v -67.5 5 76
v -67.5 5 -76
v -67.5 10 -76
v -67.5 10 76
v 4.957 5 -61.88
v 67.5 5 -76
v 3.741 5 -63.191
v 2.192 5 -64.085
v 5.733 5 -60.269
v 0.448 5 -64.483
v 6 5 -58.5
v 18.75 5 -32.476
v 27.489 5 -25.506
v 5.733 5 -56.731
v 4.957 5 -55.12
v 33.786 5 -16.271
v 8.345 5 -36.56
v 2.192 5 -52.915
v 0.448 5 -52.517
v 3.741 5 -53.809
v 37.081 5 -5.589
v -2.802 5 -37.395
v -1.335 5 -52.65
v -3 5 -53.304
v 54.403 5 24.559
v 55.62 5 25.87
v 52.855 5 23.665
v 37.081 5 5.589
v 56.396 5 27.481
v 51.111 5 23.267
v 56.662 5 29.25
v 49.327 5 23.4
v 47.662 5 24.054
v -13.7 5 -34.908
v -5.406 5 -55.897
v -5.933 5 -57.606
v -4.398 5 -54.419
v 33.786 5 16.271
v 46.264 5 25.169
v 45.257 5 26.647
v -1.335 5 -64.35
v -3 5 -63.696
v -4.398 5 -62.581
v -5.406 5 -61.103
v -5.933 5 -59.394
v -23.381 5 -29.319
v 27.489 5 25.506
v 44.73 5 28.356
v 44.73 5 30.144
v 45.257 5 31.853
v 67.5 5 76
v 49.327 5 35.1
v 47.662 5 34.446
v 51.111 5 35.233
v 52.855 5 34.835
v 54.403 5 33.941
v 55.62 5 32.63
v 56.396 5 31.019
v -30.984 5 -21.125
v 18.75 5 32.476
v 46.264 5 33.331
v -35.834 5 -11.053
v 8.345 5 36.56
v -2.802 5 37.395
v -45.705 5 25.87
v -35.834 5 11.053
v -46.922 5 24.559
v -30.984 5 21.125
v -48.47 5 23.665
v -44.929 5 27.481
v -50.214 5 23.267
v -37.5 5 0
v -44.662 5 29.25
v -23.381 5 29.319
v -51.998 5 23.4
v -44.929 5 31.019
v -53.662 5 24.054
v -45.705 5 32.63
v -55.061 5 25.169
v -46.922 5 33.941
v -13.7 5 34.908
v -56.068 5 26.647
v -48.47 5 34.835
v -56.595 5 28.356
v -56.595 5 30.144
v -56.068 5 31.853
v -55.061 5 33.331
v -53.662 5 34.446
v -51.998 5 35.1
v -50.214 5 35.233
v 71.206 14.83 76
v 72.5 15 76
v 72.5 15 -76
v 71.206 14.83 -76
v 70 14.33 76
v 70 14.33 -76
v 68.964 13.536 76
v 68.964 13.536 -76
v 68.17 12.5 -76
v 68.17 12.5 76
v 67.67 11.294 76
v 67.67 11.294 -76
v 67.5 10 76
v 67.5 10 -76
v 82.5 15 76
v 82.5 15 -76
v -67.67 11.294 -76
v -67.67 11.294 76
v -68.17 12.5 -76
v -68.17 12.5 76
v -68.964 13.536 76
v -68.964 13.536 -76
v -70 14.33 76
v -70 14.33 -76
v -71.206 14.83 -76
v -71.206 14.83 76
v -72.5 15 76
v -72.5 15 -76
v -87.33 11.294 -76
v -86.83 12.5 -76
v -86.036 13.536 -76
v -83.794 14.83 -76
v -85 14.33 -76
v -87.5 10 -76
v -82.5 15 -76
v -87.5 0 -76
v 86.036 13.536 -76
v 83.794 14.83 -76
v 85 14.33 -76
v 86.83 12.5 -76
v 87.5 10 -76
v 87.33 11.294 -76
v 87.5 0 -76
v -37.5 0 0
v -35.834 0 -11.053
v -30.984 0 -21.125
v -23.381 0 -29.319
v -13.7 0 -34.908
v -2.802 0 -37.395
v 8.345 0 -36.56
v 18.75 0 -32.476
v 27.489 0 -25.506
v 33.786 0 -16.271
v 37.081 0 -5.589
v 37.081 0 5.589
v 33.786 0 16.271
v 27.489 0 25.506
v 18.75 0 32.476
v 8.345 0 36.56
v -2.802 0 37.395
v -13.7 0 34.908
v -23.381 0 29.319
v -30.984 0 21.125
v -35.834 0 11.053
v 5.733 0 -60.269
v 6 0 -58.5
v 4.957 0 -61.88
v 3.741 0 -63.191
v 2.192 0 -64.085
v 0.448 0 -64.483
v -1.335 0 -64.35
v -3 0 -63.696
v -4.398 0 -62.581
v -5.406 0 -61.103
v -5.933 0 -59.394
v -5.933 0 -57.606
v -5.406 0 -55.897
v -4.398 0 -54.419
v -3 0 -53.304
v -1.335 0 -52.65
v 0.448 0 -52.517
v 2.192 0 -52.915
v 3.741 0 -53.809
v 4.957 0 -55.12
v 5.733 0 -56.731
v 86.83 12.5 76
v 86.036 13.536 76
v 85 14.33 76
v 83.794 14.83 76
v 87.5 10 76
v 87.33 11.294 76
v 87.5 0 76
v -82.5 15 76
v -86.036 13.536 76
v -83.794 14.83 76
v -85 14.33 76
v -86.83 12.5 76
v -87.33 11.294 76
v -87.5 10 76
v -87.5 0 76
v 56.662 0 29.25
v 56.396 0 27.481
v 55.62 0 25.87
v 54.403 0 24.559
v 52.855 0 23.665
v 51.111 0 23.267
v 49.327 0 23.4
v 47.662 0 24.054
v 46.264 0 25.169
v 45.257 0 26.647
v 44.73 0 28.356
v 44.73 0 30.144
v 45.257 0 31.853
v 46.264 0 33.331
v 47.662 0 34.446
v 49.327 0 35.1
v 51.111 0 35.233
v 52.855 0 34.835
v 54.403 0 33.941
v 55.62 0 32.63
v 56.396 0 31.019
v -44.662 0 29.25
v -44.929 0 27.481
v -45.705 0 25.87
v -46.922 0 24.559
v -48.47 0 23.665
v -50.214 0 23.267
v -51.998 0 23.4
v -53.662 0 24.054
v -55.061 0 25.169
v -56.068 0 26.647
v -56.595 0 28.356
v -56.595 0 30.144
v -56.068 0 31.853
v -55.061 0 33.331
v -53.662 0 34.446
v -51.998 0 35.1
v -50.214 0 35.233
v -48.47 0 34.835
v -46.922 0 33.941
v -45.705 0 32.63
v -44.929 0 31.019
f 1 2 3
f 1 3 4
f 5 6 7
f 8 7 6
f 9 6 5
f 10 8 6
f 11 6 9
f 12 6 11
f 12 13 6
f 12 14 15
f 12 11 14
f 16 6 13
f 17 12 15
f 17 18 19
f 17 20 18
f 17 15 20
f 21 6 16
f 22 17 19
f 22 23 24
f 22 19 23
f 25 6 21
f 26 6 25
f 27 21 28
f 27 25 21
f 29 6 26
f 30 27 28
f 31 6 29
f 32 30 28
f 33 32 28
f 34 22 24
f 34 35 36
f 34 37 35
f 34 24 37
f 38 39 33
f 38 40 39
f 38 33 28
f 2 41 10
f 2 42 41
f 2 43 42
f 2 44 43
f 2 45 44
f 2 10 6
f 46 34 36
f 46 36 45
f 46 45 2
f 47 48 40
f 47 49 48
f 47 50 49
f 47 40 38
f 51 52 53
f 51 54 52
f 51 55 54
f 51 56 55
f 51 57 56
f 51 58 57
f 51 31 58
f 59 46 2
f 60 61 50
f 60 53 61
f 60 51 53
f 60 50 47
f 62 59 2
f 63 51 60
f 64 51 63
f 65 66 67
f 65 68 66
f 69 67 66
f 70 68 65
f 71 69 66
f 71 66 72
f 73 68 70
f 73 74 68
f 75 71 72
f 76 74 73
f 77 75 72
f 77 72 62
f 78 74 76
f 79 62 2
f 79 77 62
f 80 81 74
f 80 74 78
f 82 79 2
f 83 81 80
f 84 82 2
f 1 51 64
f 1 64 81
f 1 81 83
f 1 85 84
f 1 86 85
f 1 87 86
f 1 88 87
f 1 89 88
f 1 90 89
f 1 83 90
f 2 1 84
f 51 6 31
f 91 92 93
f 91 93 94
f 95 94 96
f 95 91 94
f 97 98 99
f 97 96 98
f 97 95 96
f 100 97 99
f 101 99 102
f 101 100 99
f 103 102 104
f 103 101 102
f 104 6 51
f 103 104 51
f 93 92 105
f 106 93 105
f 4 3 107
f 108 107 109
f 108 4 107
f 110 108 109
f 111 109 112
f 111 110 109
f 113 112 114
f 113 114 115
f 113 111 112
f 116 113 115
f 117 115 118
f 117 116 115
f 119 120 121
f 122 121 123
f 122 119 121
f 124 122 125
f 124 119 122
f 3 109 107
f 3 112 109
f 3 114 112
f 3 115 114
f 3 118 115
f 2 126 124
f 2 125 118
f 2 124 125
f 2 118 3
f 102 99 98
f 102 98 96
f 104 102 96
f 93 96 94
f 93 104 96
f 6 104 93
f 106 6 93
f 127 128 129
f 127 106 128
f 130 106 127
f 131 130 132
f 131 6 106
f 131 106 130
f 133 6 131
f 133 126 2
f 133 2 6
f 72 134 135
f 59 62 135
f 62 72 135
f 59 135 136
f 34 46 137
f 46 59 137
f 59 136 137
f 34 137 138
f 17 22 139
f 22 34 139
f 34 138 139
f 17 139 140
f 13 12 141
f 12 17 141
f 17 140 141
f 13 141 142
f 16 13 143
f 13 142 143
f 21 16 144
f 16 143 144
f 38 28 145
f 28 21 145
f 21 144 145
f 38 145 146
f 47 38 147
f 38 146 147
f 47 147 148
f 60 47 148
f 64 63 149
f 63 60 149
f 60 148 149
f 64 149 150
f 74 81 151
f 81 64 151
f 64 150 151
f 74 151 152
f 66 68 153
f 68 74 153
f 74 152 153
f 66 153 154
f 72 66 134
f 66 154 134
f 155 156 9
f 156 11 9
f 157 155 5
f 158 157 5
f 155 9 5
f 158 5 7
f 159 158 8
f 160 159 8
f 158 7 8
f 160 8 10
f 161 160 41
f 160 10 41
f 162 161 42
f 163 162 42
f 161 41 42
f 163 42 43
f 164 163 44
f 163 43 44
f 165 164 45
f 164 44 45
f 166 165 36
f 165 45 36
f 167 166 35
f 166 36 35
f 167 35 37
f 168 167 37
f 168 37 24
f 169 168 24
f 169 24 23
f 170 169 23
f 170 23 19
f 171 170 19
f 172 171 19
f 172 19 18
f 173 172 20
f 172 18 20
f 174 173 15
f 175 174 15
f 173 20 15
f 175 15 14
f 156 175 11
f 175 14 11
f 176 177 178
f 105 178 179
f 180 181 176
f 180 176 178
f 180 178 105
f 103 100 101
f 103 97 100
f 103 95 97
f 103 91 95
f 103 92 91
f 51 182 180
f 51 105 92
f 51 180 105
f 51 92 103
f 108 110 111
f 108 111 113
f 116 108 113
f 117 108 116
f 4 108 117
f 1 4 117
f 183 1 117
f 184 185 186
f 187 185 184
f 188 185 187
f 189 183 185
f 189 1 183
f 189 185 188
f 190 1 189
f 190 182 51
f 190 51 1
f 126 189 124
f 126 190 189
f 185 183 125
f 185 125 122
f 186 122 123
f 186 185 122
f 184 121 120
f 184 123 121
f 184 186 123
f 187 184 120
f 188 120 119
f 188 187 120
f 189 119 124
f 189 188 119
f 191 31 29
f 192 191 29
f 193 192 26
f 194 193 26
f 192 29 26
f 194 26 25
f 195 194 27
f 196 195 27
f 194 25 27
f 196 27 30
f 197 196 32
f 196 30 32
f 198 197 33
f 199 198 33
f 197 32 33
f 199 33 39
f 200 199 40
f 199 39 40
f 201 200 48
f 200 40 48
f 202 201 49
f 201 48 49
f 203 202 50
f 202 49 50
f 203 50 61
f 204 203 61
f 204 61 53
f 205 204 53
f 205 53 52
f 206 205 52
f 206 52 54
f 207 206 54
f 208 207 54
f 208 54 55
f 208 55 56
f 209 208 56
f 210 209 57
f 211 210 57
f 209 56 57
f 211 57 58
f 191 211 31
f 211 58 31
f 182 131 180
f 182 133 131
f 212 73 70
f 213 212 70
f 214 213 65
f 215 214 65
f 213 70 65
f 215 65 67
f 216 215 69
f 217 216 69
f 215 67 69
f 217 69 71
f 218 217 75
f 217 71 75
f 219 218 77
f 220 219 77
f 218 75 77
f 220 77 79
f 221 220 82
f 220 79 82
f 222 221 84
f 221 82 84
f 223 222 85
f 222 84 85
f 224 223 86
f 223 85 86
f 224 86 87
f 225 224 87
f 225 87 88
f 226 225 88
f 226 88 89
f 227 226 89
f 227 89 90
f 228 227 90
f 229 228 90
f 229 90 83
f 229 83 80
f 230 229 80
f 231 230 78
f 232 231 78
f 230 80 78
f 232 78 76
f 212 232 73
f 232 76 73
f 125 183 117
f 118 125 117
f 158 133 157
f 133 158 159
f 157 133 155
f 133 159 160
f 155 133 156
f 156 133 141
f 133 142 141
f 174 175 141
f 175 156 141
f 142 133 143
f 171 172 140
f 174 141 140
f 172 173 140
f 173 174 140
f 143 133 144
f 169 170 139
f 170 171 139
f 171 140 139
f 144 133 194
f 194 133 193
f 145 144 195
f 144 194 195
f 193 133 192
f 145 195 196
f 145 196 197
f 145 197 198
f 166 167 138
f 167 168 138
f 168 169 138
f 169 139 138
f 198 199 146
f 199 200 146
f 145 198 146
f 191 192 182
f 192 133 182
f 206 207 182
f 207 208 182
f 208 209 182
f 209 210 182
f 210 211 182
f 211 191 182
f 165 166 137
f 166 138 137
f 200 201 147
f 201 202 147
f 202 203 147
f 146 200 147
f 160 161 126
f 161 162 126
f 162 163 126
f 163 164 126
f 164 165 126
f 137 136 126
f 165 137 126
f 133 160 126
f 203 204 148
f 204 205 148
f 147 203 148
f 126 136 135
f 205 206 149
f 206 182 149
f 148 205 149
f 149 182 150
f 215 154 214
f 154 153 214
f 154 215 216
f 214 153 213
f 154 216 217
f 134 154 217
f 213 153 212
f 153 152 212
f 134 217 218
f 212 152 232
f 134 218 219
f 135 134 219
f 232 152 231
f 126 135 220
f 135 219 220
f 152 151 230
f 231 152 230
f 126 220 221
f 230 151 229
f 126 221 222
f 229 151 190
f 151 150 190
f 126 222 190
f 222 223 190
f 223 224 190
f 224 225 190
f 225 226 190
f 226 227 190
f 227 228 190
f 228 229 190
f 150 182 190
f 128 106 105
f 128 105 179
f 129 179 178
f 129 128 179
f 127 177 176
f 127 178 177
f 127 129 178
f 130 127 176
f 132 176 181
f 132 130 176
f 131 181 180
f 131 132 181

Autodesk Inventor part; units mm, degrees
ref_plane "YZ Plane" through (0, 0, 0) normal (1, 0, 0) x (0, 1, 0)
ref_plane "XZ Plane" through (0, 0, 0) normal (0, 1, 0) x (-1, 0, 0)
ref_plane "XY Plane" through (0, 0, 0) normal (0, 0, 1) x (1, 0, 0)
sketch "Sketch1" plane through (0, 0, 0) normal (0, 1, 0) x (-1, 0, 0)
  line L0 (-30.1299, 69.45) -> (30.245, 69.45)
  line L1 (30.245, -69.45) -> (-30.1299, -69.45)
  circle A0 centre (0, 0) radius 37.5
  arc A1 (-30.1299, 69.45) -> (-30.1299, -69.45) centre (0, 0) ccw
  arc A2 (30.245, -69.45) -> (30.245, 69.45) centre (0, 0) ccw
  circle A3 centre (0, -58.5) radius 6
  circle A4 centre (0, -58.5) radius 3.25
  circle A5 centre (0, 0) radius 45.75 construction
  circle A6 centre (50.6625, 29.25) radius 6
  circle A7 centre (50.6625, 29.25) radius 3.25
  circle A8 centre (-50.6625, 29.25) radius 6
  circle A9 centre (-50.6625, 29.25) radius 3.25
  line L2 (87.5, -76) -> (-87.5, -76)
  line L3 (-87.5, -76) -> (-87.5, 76)
  line L4 (-87.5, 76) -> (87.5, 76)
  line L5 (87.5, 76) -> (87.5, -76)
  point P0 (-87.5, 0)
  point P1 (0, -76)
  dimension "d1" = 75
  dimension "d2" = 69.45
  dimension "d3" = 58.5
  dimension "d4" = 12
  dimension "d5" = 6.5
  dimension "d8" = 360
  dimension "d57" = 75.75
  dimension "d58" = 69.45
  dimension "d59" = 69.45
  dimension "d69" = 152
  dimension "d70" = 175
extrude "Extrusion1" add sketch "Sketch1" along normal blind 5 contours L0 A2 L1 A1 | A3 | A6 | A8 | L2 L3 L4 L5
sketch "Sketch2" plane through (0, 5, 0) normal (0, 1, 0) x (1, 0, 0)
  circle A0 centre (0, 58.5) radius 3.25 projected
  circle A1 centre (0, 58.5) radius 6
  circle A2 centre (50.6625, -29.25) radius 3.25 projected
  circle A3 centre (50.6625, -29.25) radius 6
  circle A4 centre (-50.6625, -29.25) radius 3.25 projected
  circle A5 centre (-50.6625, -29.25) radius 6
  point P0 (0, 0)
  dimension "d12" = 12
  dimension "d13" = 12
  dimension "d14" = 12
extrude "Extrusion2" cut sketch "Sketch2" against normal blind 6.5
sketch "Sketch11" plane through (0, 5, 0) normal (0, 1, 0) x (1, 0, 0)
  circle A0 centre (-50.6625, -29.25) radius 6 projected
  circle A1 centre (0, 58.5) radius 6 projected
  circle A2 centre (50.6625, -29.25) radius 6 projected
  circle A3 centre (0, 0) radius 37.5 projected
  line L0 (87.5, 76) -> (-87.5, 76) projected
  line L1 (-87.5, 76) -> (-87.5, -76) projected
  line L2 (-87.5, -76) -> (87.5, -76) projected
  line L3 (87.5, -76) -> (87.5, 76) projected
  line L4 (-87.5, 76) -> (-67.5, 76)
  line L5 (-67.5, 76) -> (-67.5, -76)
  line L6 (-67.5, -76) -> (-87.5, -76)
  line L7 (-87.5, -76) -> (-87.5, 76)
  line L8 (87.5, 76) -> (-87.5, 76) projected
  line L9 (87.5, -76) -> (-87.5, -76) projected
  line L10 (87.5, 76) -> (67.5, 76)
  line L11 (67.5, 76) -> (67.5, -76)
  line L12 (67.5, -76) -> (87.5, -76)
  line L13 (87.5, -76) -> (87.5, 76)
  point P0 (0, 0)
  dimension "d71" = 20
  dimension "d72" = 20
extrude "Extrusion11" add sketch "Sketch11" along normal blind 10 contours L3 L2 L11 L0 | L5 L2 L1 L0
fillet "Fillet9" radius 5 4 edges at (-67.5, 15, 0) (-87.5, 15, 0) (67.5, 15, 0) (87.5, 15, 0)
equation "\"d2\" = d59"
equation "\"d59\" = d58"
properties part number "soporte inferior ridgid -2"
